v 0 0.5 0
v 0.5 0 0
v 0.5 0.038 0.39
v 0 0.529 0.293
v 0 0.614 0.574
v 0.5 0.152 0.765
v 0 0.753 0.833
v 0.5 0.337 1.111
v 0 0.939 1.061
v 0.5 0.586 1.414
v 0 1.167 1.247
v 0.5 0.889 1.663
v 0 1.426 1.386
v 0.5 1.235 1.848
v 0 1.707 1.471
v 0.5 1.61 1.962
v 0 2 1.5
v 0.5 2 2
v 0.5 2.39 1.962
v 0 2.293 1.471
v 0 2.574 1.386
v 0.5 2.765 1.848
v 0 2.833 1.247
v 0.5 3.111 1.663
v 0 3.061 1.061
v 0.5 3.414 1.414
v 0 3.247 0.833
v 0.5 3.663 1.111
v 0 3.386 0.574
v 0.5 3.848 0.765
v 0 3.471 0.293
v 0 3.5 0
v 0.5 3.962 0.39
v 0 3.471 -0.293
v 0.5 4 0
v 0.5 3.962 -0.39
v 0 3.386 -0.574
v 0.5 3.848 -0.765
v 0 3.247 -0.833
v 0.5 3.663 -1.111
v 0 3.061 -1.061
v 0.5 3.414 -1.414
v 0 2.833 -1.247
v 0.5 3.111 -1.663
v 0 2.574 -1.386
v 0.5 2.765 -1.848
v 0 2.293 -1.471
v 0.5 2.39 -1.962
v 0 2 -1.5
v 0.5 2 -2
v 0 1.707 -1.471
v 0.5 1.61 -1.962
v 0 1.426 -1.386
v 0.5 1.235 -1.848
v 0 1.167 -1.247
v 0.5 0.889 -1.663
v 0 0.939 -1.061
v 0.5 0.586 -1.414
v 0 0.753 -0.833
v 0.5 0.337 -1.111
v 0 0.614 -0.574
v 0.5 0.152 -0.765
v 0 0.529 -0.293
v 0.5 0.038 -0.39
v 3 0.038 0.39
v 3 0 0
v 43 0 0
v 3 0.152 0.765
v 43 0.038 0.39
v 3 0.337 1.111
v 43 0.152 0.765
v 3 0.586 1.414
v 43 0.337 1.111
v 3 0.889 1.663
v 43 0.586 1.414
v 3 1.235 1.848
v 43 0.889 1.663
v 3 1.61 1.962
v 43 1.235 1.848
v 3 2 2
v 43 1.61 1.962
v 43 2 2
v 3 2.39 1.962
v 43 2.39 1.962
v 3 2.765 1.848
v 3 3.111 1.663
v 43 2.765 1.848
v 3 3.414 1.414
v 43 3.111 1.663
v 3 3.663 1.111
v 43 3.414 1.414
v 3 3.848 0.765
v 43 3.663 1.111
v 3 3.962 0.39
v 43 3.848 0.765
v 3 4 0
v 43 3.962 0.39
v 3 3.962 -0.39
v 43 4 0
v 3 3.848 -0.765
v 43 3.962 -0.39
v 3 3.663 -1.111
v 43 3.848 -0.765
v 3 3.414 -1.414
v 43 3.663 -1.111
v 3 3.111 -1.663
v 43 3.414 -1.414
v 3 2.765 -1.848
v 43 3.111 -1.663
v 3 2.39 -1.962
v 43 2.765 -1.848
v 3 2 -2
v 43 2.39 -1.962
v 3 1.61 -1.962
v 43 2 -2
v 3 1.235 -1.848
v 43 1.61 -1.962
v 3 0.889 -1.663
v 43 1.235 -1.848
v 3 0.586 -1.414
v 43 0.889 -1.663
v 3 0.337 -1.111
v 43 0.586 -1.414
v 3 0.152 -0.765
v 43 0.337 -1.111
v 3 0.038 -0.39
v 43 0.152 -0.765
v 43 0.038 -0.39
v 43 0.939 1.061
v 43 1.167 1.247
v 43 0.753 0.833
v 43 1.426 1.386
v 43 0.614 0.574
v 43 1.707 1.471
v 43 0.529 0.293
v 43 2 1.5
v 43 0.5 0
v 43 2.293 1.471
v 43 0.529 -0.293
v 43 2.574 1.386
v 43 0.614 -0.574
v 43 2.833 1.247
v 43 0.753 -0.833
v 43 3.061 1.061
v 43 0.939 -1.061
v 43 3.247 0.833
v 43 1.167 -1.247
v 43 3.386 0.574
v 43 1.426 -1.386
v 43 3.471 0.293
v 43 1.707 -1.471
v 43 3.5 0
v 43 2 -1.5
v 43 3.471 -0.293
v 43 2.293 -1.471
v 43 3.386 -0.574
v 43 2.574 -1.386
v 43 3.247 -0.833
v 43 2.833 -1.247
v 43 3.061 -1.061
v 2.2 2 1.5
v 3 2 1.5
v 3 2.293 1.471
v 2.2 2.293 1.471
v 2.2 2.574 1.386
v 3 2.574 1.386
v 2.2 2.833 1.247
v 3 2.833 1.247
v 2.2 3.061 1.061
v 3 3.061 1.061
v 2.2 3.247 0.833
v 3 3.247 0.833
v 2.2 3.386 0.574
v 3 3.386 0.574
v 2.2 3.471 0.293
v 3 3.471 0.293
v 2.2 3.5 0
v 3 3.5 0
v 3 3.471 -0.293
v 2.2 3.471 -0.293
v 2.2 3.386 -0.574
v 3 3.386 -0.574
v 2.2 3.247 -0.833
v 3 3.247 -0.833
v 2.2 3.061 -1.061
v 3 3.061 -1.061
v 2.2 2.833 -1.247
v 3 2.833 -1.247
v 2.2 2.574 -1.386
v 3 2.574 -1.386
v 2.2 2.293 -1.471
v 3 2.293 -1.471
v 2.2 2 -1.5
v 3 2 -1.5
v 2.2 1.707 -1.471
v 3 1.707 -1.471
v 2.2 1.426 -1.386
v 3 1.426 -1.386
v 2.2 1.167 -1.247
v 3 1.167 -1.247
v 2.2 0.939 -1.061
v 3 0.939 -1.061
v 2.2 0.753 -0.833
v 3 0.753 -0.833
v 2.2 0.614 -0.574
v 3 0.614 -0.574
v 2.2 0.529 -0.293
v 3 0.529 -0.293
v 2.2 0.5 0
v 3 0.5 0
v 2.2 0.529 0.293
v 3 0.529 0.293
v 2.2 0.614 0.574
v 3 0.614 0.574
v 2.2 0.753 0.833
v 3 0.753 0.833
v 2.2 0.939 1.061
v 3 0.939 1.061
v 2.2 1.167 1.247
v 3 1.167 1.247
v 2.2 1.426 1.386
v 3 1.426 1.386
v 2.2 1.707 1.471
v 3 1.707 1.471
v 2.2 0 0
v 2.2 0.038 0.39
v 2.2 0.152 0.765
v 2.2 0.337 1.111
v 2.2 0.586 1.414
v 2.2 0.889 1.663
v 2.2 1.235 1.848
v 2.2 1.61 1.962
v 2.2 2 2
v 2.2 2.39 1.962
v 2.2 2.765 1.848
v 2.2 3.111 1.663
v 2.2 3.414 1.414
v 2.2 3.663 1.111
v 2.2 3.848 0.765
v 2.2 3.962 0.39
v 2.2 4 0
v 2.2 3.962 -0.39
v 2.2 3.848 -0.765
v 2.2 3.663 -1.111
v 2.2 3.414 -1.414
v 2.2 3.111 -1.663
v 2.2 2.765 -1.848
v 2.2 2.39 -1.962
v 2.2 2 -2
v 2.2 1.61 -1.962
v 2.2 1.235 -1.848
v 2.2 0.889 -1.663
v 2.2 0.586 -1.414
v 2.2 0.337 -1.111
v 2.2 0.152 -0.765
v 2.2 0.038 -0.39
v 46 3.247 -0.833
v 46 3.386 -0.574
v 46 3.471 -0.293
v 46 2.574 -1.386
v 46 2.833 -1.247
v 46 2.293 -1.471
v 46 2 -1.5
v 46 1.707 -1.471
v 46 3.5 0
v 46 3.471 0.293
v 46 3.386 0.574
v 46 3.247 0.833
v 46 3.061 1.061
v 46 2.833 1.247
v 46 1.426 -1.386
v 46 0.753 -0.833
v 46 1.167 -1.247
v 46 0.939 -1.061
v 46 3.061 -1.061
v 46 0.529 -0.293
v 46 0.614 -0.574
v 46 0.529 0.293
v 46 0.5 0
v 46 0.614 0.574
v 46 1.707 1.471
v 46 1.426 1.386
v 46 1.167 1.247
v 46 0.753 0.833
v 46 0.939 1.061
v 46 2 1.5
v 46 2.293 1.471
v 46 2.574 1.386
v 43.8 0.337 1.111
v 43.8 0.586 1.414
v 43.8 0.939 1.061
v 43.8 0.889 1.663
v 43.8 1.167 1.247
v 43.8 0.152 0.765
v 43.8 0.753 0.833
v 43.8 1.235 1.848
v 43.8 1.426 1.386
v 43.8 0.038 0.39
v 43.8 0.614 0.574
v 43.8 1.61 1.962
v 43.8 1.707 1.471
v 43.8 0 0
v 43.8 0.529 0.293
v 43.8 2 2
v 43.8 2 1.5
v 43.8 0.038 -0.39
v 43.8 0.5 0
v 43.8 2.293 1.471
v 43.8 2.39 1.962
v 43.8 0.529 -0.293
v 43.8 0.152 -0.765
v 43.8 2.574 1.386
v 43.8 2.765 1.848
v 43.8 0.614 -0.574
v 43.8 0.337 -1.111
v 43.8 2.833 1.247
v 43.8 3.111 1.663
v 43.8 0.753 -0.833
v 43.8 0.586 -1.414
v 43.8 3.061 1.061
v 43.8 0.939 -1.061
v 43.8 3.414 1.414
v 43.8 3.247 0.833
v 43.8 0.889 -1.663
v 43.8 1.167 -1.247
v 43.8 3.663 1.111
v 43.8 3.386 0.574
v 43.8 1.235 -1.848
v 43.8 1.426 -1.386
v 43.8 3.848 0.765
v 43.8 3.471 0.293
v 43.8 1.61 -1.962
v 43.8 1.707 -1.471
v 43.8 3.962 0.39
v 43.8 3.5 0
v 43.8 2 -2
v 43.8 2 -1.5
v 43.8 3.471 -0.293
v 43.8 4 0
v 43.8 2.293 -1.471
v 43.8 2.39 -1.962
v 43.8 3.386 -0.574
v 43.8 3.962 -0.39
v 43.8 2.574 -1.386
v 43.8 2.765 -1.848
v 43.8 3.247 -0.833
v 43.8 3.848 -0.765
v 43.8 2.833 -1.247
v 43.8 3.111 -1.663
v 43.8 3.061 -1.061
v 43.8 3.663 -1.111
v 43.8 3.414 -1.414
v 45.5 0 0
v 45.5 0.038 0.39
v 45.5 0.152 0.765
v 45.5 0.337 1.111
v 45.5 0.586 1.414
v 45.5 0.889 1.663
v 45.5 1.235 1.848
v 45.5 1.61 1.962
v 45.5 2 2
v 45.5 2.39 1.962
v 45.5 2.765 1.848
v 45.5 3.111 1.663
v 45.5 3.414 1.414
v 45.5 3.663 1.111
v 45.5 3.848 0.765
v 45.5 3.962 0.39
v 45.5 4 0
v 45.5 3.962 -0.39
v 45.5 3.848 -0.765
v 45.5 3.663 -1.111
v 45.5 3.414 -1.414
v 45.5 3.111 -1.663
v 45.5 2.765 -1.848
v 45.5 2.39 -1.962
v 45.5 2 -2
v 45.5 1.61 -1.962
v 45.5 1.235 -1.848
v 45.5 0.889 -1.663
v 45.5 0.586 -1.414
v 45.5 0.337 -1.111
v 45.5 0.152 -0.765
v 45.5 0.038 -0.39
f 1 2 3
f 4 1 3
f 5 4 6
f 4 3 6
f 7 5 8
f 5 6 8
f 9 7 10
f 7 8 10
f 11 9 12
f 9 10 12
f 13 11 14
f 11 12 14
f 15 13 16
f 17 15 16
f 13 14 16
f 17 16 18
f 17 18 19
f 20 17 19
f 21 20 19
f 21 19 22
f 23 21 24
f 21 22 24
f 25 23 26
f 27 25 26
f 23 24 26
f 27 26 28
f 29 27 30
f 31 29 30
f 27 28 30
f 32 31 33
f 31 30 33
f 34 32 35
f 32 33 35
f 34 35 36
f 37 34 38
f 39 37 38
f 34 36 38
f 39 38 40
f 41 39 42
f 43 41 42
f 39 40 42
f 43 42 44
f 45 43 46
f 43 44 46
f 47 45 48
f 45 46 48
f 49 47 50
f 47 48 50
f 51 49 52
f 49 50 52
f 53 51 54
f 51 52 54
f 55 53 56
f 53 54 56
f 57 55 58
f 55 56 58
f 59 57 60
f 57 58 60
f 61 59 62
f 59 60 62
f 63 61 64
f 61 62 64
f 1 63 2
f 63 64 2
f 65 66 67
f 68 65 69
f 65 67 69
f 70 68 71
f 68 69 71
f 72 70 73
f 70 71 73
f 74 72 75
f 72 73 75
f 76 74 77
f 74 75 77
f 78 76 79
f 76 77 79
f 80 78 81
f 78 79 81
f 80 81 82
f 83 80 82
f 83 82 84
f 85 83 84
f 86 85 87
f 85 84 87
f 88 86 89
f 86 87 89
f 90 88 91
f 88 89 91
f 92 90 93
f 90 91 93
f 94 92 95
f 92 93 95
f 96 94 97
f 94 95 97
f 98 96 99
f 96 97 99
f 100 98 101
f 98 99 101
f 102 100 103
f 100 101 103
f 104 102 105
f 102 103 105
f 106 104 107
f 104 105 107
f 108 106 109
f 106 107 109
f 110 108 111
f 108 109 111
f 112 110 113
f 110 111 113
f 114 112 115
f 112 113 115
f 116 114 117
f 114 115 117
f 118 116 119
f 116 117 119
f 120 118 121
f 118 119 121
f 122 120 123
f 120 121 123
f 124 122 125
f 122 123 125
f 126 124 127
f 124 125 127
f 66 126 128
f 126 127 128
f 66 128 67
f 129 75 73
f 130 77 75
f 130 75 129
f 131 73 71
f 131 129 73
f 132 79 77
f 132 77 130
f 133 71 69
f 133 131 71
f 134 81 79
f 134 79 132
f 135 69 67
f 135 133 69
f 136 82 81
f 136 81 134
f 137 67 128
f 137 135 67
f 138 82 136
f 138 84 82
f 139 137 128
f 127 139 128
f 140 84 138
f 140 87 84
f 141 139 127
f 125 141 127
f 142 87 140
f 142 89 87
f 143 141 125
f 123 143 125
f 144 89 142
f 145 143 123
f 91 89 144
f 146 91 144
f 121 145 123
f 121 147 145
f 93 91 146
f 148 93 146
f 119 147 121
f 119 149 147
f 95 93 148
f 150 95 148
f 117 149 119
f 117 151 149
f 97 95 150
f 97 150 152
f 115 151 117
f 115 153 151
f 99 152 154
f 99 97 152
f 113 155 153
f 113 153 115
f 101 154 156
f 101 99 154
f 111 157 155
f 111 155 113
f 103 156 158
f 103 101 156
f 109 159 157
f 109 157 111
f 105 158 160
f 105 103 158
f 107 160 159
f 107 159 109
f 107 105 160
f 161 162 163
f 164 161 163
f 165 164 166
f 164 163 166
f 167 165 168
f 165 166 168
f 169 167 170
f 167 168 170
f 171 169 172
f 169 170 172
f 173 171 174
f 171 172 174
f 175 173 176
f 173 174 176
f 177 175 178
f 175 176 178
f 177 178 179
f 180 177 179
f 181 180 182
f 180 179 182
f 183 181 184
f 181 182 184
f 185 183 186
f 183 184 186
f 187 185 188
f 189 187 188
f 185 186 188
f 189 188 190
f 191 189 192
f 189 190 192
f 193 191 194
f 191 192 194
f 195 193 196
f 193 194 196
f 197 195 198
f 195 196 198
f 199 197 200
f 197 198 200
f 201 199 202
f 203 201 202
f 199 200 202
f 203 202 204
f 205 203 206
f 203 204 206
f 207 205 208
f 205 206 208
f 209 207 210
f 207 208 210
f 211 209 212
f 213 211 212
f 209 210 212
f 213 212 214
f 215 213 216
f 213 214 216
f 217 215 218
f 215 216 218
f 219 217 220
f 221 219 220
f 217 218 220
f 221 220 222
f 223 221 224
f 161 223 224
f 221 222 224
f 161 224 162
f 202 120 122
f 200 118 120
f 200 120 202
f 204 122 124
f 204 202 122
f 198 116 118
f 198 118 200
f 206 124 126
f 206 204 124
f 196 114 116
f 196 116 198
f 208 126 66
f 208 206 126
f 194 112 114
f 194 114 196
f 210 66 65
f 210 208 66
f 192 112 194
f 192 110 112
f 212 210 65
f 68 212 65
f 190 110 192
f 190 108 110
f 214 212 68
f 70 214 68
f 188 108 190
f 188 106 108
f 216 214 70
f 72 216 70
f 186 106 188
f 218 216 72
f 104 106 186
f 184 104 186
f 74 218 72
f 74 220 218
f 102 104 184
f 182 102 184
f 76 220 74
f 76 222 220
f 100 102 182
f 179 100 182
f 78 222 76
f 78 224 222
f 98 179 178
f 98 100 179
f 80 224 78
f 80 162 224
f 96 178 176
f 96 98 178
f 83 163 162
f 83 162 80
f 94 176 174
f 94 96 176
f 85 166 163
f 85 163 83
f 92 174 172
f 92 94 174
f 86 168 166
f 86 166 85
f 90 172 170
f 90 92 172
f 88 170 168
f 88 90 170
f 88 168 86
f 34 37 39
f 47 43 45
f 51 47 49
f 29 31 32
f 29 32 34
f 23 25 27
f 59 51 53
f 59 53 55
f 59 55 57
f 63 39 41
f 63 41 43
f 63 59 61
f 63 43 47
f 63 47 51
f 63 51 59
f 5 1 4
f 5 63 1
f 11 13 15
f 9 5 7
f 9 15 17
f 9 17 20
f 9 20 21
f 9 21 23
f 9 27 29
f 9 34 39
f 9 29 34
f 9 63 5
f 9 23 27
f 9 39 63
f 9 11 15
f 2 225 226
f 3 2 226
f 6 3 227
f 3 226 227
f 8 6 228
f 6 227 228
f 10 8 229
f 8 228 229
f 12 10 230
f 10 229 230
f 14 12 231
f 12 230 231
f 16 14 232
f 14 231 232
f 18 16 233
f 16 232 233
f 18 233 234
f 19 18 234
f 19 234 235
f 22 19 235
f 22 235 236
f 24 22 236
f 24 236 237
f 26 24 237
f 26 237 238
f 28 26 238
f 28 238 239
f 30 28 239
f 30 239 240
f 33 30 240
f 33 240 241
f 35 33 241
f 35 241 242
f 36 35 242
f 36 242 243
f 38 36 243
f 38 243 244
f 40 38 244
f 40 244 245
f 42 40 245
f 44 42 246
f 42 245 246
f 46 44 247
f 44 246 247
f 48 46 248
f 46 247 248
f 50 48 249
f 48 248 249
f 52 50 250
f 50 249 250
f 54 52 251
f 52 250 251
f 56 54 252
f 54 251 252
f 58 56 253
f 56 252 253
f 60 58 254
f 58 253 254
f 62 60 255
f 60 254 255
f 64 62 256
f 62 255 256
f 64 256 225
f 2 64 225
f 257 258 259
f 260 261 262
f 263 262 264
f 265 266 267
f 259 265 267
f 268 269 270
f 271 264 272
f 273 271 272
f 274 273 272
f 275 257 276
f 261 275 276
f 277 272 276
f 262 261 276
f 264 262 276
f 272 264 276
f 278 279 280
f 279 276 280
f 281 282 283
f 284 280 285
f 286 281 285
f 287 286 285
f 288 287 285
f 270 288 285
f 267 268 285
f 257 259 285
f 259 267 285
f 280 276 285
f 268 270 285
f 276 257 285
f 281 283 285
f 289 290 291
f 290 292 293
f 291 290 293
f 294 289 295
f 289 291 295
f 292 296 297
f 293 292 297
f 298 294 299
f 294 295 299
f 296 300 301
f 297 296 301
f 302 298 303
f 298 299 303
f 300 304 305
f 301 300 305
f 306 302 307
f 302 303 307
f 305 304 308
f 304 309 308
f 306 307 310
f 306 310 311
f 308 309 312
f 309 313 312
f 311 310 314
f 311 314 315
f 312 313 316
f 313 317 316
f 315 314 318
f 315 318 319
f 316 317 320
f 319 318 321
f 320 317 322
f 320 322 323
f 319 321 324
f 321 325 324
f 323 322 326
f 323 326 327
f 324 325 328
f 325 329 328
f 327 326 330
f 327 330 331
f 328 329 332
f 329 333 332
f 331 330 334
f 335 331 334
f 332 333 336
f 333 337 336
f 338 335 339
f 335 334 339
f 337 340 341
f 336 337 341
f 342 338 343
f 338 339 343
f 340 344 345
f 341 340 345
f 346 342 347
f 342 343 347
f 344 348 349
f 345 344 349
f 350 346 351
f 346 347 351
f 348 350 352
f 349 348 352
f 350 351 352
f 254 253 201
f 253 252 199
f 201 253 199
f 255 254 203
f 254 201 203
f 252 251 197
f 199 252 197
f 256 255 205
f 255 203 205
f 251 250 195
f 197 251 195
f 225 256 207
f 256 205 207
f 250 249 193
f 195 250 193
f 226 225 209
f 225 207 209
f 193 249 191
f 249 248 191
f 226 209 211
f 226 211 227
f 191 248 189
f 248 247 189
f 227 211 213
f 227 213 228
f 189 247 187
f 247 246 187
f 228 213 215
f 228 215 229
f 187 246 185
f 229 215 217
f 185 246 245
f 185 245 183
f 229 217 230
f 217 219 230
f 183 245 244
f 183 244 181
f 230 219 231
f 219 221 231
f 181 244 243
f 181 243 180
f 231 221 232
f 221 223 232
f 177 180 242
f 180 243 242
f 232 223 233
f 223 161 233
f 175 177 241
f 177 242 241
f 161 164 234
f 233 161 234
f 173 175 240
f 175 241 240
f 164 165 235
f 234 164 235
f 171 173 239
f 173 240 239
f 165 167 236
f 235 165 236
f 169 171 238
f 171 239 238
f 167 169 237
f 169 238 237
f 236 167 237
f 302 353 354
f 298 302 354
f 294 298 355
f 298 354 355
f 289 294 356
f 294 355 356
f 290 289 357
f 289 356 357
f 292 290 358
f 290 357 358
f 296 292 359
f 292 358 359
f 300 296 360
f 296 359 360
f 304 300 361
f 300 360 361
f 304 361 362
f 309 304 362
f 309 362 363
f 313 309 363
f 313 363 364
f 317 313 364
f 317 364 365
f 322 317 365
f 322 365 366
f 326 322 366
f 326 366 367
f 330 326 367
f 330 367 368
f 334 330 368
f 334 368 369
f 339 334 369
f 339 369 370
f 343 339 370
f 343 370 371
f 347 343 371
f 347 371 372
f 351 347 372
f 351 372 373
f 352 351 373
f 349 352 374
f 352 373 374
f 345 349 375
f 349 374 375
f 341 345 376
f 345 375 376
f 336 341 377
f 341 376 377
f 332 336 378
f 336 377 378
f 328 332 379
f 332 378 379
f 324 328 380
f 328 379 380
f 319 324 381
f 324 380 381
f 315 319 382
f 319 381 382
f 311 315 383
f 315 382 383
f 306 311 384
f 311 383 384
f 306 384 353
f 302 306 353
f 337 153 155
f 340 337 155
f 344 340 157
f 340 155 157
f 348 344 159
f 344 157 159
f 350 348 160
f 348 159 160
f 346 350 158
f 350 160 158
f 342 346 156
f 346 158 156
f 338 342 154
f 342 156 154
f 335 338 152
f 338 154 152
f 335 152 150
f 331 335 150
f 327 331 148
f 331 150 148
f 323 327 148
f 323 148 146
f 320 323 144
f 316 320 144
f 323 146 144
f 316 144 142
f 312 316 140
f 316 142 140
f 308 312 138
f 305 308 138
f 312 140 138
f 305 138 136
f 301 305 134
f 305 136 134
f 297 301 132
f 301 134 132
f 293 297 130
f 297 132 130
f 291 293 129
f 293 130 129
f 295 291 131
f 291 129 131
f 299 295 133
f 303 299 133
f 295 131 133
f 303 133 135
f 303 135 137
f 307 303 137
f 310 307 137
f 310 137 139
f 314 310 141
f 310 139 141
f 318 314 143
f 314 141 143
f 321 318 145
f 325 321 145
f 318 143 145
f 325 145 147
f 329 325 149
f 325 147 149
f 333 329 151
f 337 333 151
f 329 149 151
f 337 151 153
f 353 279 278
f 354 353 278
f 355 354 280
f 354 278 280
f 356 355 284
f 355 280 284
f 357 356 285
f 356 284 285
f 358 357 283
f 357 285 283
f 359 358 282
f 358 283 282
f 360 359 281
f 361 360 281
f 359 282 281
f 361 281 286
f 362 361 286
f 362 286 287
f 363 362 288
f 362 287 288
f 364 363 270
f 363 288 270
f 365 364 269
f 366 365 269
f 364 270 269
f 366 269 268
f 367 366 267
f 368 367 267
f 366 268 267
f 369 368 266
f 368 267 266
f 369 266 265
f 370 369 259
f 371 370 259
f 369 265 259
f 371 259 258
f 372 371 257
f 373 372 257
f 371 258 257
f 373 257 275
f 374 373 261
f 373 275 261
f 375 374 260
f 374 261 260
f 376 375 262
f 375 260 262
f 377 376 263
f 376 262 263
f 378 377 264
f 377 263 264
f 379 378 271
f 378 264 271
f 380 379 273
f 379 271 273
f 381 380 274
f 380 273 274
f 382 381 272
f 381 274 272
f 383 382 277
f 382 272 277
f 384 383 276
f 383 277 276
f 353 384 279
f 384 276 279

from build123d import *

# Parameters (mm, degrees)
SKETCH1_W          = 46
SKETCH1_H          = 2
CUT_EXTRUDE1_START = -3
SKETCH2_R          = 2
SKETCH2_R_2        = 1.5
CUT_EXTRUDE1_DEPTH = 0.8
CUT_EXTRUDE3_START = -3
SKETCH3_R          = 2
SKETCH3_R_2        = 1.5
CUT_EXTRUDE3_DEPTH = 0.8
CHAMFER1_SIZE      = 0.5


with BuildPart() as part:
    # Sketch1 → Revolve2 (revolve)
    with BuildSketch(Plane.XY):
        with Locations((23, 1)):
            Rectangle(SKETCH1_W, SKETCH1_H)
    revolve(axis=Axis((46, 2, 0), (-1, 0, 0)))

    # Sketch2 → Cut-Extrude1 (cut)
    with BuildSketch(Plane(origin=(46, 0, 0), x_dir=(0, 0, -1), z_dir=(1, 0, 0)).offset(CUT_EXTRUDE1_START)):
        with Locations((0, 2)):
            Circle(SKETCH2_R)
        with Locations((0, 2)):
            Circle(SKETCH2_R_2, mode=Mode.SUBTRACT)
    extrude(amount=CUT_EXTRUDE1_DEPTH, mode=Mode.SUBTRACT)

    # Sketch3 → Cut-Extrude3 (cut)
    with BuildSketch(Plane.ZY.offset(CUT_EXTRUDE3_START)):
        with Locations((0, 2)):
            Circle(SKETCH3_R)
        with Locations((0, 2)):
            Circle(SKETCH3_R_2, mode=Mode.SUBTRACT)
    extrude(amount=CUT_EXTRUDE3_DEPTH, mode=Mode.SUBTRACT)

    # Chamfer1
    chamfer1_edges = [part.edges().sort_by_distance(p)[0] for p in [
        (46, 4, 0),
        (0, 4, 0),
    ]]
    chamfer(chamfer1_edges, length=CHAMFER1_SIZE)


solid = part.part
